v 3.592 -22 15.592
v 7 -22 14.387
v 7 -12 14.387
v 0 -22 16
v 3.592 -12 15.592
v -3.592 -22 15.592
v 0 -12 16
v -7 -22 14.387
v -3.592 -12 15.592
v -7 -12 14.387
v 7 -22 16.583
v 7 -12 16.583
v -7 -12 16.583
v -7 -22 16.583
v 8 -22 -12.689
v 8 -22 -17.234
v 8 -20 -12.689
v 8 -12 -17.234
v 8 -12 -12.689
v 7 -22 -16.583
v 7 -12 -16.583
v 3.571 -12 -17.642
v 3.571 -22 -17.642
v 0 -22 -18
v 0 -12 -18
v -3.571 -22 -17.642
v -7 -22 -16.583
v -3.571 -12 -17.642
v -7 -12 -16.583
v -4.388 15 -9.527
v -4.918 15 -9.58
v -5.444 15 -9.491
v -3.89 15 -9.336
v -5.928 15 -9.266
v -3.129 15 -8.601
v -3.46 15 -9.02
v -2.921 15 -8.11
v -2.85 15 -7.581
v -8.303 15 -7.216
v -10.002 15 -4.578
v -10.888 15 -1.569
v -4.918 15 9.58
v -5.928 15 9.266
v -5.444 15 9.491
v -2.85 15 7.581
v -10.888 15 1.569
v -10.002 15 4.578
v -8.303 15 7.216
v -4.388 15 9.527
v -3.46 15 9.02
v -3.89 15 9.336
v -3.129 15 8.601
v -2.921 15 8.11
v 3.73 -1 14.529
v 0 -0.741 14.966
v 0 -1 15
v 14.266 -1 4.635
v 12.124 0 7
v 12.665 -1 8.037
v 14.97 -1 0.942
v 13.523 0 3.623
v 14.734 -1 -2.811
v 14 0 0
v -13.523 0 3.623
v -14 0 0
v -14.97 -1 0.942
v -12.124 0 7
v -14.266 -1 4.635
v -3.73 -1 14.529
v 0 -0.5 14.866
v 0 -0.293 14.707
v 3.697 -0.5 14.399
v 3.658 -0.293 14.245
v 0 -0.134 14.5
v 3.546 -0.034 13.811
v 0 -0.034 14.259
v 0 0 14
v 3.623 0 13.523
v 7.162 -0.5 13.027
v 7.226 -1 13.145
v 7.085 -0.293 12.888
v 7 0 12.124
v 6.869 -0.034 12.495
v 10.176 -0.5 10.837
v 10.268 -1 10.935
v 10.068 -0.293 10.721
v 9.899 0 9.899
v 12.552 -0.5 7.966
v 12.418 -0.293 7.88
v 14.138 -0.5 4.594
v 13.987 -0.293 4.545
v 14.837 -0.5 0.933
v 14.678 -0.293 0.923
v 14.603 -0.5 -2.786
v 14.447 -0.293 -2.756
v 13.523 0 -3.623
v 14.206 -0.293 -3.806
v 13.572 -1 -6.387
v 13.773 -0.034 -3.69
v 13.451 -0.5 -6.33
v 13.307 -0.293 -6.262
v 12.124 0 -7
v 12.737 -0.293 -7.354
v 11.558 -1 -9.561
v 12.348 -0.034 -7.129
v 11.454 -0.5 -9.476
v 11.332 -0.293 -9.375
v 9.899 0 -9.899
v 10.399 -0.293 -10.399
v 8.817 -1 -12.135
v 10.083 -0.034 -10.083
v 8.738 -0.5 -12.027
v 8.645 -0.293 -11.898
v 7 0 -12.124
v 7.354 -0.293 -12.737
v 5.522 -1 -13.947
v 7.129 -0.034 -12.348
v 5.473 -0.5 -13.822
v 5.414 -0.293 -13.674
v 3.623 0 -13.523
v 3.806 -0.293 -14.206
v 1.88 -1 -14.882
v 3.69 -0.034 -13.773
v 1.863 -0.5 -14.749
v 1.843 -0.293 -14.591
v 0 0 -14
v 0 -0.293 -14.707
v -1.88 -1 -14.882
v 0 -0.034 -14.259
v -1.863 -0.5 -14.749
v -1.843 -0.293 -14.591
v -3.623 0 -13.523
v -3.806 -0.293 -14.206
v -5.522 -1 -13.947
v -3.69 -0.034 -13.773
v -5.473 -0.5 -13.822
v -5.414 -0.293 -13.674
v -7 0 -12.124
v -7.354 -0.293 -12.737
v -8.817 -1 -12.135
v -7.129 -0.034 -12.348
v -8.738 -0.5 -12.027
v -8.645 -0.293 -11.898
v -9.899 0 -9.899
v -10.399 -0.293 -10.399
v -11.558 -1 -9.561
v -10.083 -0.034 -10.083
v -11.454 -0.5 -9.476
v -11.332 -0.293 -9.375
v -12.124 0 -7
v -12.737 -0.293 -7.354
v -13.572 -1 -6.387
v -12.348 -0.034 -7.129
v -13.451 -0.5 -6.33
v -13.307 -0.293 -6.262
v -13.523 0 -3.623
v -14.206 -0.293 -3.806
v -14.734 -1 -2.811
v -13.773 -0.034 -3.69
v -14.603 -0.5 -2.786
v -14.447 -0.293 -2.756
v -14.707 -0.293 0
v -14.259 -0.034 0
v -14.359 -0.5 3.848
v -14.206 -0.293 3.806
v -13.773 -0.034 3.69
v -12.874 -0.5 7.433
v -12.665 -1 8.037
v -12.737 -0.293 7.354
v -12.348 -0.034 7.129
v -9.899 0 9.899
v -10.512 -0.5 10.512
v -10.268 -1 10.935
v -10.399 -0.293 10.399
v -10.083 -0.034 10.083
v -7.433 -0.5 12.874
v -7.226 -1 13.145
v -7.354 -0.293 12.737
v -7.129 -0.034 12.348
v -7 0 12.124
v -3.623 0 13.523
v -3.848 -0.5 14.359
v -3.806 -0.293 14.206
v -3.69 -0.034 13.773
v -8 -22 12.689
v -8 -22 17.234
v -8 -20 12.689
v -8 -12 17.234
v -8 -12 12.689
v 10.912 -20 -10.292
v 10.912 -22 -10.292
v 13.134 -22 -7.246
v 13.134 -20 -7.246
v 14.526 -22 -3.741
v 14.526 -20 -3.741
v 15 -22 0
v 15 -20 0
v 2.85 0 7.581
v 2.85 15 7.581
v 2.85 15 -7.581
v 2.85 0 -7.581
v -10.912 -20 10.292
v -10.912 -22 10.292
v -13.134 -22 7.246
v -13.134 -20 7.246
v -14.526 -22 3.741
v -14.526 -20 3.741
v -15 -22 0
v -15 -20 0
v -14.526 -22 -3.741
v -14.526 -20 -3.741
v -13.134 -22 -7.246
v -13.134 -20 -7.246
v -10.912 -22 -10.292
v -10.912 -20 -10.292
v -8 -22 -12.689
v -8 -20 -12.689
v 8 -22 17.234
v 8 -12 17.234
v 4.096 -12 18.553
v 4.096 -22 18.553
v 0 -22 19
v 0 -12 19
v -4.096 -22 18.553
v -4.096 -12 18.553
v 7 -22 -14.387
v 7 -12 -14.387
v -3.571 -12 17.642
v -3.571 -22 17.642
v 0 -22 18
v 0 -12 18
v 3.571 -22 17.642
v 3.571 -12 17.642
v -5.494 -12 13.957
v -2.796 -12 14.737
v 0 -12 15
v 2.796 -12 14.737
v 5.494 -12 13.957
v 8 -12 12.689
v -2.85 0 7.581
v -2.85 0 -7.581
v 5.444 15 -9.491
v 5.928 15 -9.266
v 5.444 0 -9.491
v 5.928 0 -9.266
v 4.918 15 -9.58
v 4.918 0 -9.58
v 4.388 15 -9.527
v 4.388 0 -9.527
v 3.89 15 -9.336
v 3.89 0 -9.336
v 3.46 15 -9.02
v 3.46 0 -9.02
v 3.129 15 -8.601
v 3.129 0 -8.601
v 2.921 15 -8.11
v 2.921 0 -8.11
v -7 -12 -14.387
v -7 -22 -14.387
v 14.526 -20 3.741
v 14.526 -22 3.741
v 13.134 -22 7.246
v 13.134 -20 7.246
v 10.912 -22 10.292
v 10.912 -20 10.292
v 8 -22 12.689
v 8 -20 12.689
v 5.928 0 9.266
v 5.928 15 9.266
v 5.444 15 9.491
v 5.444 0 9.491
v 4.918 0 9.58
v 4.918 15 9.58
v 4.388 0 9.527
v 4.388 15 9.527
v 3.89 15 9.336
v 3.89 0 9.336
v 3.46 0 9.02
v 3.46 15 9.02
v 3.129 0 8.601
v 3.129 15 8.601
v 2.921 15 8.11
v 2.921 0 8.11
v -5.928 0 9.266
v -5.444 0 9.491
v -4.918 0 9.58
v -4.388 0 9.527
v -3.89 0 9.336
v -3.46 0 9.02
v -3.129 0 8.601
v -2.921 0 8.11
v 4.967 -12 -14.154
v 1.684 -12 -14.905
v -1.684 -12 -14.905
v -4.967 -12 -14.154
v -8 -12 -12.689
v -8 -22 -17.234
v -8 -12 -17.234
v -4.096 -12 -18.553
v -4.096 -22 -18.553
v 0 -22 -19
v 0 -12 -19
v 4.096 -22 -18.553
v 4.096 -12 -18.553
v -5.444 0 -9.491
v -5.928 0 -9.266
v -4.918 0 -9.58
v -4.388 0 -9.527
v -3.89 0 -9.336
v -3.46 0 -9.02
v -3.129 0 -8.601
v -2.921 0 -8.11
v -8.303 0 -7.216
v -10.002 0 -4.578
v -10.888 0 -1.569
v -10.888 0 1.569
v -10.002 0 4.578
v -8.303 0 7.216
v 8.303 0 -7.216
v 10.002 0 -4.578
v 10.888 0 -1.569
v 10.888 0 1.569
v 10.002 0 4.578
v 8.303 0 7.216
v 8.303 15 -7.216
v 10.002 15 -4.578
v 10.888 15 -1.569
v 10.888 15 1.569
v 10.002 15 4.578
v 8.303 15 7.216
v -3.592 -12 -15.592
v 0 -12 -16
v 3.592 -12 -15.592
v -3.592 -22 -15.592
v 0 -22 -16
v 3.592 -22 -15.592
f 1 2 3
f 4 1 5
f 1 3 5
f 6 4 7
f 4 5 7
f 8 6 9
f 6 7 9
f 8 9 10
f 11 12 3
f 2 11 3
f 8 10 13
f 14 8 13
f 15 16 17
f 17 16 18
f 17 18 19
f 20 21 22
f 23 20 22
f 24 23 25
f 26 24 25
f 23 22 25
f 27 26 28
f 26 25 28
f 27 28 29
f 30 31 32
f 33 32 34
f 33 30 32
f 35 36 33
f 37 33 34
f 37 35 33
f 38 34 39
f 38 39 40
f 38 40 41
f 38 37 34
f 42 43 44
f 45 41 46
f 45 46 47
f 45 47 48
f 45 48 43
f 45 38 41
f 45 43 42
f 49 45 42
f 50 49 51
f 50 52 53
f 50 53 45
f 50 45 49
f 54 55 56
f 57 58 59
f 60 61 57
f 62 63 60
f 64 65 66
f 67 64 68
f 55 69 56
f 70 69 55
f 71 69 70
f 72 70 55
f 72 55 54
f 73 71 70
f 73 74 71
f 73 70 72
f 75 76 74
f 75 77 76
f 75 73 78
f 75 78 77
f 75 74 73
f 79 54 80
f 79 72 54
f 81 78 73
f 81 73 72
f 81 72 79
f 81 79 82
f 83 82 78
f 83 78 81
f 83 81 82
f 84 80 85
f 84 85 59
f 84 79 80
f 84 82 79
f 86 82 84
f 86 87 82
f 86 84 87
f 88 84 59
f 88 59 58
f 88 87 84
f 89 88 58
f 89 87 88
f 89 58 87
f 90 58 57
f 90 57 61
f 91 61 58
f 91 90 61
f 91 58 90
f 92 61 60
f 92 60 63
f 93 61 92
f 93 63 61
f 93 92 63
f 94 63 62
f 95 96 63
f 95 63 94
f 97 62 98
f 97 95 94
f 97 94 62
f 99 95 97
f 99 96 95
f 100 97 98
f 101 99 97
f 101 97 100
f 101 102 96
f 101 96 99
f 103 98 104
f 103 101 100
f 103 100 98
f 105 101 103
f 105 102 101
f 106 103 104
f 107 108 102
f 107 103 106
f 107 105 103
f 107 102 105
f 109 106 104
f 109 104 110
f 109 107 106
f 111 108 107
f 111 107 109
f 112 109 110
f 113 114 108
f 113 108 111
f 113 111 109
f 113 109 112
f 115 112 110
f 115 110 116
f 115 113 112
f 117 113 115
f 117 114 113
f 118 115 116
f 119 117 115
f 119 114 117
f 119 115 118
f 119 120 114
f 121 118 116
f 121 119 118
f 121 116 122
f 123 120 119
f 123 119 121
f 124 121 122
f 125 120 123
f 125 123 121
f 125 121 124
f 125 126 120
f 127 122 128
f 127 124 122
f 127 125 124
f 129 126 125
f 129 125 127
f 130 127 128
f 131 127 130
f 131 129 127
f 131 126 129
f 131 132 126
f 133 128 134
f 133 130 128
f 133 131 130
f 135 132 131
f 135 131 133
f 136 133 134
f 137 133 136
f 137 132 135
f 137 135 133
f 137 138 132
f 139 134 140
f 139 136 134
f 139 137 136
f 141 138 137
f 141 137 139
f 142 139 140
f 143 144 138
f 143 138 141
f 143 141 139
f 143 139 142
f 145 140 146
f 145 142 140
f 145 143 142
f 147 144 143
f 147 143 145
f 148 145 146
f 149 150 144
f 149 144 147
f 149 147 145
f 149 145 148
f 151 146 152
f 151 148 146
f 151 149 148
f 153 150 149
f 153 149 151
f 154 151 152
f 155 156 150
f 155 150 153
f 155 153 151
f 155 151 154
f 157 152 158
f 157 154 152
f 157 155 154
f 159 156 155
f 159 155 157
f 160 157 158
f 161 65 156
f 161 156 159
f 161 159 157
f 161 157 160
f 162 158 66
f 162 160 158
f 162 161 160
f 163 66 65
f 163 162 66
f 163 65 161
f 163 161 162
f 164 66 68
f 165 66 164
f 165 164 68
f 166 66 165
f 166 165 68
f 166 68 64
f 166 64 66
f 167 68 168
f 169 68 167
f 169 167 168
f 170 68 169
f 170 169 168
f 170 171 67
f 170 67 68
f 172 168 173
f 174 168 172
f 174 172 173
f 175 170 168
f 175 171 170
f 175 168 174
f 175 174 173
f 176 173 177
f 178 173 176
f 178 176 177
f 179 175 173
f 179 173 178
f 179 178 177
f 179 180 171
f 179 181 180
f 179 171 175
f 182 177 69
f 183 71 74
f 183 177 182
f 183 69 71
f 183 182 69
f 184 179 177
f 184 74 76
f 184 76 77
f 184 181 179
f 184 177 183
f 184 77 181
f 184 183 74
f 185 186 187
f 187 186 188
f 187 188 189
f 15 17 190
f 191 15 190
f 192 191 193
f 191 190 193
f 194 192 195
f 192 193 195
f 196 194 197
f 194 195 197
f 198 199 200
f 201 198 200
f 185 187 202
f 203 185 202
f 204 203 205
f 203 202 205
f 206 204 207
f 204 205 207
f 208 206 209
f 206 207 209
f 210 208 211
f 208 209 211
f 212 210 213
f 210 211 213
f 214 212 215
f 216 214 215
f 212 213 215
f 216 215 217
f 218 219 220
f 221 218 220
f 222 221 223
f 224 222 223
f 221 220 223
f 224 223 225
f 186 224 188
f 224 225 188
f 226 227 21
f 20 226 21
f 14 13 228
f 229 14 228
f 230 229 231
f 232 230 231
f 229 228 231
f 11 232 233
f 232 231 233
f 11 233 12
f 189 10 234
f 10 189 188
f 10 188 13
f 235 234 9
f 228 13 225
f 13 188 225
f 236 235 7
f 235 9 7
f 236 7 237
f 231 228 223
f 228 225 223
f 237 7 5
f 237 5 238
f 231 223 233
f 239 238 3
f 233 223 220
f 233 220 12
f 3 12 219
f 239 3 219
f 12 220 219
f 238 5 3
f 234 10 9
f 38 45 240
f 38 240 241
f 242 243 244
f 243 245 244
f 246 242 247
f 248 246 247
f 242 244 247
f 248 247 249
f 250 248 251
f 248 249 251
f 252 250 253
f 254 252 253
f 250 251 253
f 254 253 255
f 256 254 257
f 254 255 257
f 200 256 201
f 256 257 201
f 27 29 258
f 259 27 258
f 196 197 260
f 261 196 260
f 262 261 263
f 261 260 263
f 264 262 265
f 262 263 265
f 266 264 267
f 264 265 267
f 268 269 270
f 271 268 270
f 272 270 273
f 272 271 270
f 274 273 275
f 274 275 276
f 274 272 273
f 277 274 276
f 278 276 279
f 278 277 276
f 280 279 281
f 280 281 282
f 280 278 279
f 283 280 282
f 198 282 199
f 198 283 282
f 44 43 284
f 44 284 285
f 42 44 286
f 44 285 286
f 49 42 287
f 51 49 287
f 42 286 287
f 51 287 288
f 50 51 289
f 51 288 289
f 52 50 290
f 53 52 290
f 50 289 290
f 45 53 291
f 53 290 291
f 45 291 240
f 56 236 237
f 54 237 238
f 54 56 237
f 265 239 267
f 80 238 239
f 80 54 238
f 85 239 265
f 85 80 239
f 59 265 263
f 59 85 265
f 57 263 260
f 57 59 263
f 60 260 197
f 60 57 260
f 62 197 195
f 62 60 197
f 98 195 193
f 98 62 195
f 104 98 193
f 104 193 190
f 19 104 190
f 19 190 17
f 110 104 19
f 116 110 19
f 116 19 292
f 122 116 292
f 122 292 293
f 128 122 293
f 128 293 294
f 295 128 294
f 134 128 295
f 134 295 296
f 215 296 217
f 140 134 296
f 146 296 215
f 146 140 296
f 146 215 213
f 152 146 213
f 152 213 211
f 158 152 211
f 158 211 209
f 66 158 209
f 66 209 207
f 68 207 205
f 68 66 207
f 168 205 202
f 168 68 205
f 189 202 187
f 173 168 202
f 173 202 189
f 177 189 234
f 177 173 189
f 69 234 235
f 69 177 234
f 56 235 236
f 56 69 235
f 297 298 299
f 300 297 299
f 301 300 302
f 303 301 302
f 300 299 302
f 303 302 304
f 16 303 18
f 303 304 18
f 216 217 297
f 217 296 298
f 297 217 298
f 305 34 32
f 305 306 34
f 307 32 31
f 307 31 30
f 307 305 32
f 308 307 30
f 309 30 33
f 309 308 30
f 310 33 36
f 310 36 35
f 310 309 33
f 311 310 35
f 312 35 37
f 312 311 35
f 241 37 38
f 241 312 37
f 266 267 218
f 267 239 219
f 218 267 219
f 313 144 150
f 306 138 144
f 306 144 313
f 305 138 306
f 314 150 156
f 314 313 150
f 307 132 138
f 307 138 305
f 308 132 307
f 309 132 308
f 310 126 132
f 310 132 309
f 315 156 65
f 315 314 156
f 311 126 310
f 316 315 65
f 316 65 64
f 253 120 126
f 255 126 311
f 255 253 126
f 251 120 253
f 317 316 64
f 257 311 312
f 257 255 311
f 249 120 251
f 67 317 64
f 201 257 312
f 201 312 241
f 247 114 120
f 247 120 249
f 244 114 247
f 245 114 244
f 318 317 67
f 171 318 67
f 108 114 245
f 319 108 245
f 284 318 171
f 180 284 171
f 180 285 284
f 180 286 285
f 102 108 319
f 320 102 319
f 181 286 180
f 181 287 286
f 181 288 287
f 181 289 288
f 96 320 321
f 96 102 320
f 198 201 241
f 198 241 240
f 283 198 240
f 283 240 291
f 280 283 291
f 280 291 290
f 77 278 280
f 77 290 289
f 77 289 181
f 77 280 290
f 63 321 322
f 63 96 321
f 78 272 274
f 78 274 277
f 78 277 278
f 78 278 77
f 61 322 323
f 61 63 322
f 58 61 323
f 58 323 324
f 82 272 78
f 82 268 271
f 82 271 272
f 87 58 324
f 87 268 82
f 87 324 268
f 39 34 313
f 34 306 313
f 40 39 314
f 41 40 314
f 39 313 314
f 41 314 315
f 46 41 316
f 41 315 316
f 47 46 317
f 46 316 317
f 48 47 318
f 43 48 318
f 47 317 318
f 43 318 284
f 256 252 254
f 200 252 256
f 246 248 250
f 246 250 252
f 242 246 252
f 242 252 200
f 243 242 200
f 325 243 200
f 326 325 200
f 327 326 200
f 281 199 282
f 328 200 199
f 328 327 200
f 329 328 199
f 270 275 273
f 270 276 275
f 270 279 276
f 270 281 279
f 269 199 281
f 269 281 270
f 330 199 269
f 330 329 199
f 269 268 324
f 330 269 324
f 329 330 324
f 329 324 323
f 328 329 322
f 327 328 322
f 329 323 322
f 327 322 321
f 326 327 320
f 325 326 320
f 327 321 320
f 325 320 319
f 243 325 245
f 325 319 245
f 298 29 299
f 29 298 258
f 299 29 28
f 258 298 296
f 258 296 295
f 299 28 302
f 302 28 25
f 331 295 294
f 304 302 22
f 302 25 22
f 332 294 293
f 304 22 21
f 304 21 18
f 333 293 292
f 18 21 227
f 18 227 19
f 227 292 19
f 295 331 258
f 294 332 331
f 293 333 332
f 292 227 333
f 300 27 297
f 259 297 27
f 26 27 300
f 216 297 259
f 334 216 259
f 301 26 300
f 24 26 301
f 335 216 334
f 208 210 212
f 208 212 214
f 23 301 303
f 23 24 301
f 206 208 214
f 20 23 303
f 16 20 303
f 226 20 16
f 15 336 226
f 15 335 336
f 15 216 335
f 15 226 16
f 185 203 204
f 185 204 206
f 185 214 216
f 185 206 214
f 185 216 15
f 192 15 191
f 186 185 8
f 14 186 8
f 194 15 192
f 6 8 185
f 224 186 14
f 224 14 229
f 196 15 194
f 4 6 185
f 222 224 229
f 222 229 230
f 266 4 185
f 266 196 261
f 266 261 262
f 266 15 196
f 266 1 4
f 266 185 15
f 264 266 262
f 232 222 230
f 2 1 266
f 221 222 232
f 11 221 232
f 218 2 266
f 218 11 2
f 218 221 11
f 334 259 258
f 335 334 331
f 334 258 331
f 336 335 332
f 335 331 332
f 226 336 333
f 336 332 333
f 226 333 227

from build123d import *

# Parameters (mm, degrees)
SKETCH1_R           = 15
BOSS_EXTRUDE1_DEPTH = 20
SKETCH2_R           = 11
BOSS_EXTRUDE2_DEPTH = 15
SKETCH3_W           = 5.7
SKETCH3_H           = 24
CUT_EXTRUDE1_DEPTH  = 15
FILLET3_R           = 1
FILLET4_R           = 2
BOSS_EXTRUDE3_DEPTH = 2
BOSS_EXTRUDE4_START = -10
BOSS_EXTRUDE4_DEPTH = 10
CUT_EXTRUDE2_DEPTH  = 11
CUT_EXTRUDE3_DEPTH  = 11


with BuildPart() as part:
    # Sketch1 → Boss-Extrude1 (new body)
    with BuildSketch(Plane(origin=(0, 0, 0), x_dir=(1, 0, 0), z_dir=(0, 1, 0))):
        with Locations(Location((0, 0, 0), (0, 0, 270))):
            Circle(SKETCH1_R)
    extrude(amount=-BOSS_EXTRUDE1_DEPTH)

    # Sketch2 → Boss-Extrude2 (add)
    with BuildSketch(Plane(origin=(0, 0, 0), x_dir=(1, 0, 0), z_dir=(0, 1, 0))):
        with Locations(Location((0, 0, 0), (0, 0, 270))):
            Circle(SKETCH2_R)
    extrude(amount=BOSS_EXTRUDE2_DEPTH)

    # Sketch3 → Cut-Extrude1 (cut)
    with BuildSketch(Plane(origin=(0, 15, 0), x_dir=(1, 0, 0), z_dir=(0, 1, 0))):
        Rectangle(SKETCH3_W, SKETCH3_H)
    extrude(amount=-CUT_EXTRUDE1_DEPTH, mode=Mode.SUBTRACT)

    # Fillet3
    fillet3_edges = [part.edges().sort_by_distance(p)[0] for p in [
        (0, 0, -15),
    ]]
    fillet(fillet3_edges, radius=FILLET3_R)

    # Fillet4
    fillet4_edges = [part.edges().sort_by_distance(p)[0] for p in [
        (-2.85, 7.5, -10.624382335),
        (-2.85, 7.5, 10.624382335),
        (2.85, 7.5, 10.624382335),
        (2.85, 7.5, -10.624382335),
    ]]
    fillet(fillet4_edges, radius=FILLET4_R)

    # Sketch4 → Boss-Extrude3 (add)
    with BuildSketch(Plane.XZ.offset(20)):
        with BuildLine():
            ThreePointArc((8, 12.68857754), (0, 15), (-8, 12.68857754))
            Line((-8, 12.68857754), (-8, -12.68857754))
            ThreePointArc((-8, -12.68857754), (0, -15), (8, -12.68857754))
            Line((8, -12.68857754), (8, 12.68857754))
        make_face()
        with BuildLine():
            ThreePointArc((8, 17.23368794), (0, 19), (-8, 17.23368794))
            Line((-8, 17.23368794), (-8, 12.68857754))
            ThreePointArc((-8, 12.68857754), (0, 15), (8, 12.68857754))
            Line((8, 12.68857754), (8, 17.23368794))
        make_face()
        with BuildLine():
            Line((-8, -12.68857754), (-8, -17.23368794))
            ThreePointArc((-8, -17.23368794), (0, -19), (8, -17.23368794))
            Line((8, -17.23368794), (8, -12.68857754))
            ThreePointArc((8, -12.68857754), (0, -15), (-8, -12.68857754))
        make_face()
        with BuildLine():
            Line((-8, -12.68857754), (-8, 12.68857754))
            ThreePointArc((-8, 12.68857754), (-15, 0), (-8, -12.68857754))
        make_face()
        with BuildLine():
            ThreePointArc((15, 0), (13.133925537, 7.245688373), (8, 12.68857754))
            Line((8, 12.68857754), (8, -12.68857754))
            ThreePointArc((8, -12.68857754), (13.133925537, -7.245688373), (15, 0))
        make_face()
    extrude(amount=BOSS_EXTRUDE3_DEPTH)

    # Sketch7 → Boss-Extrude4 (add)
    with BuildSketch(Plane.XZ.offset(22).offset(BOSS_EXTRUDE4_START)):
        with BuildLine():
            Line((-8, -12.68857754), (-8, -17.23368794))
            ThreePointArc((-8, -17.23368794), (0, -19), (8, -17.23368794))
            Line((8, -17.23368794), (8, -12.68857754))
            ThreePointArc((8, -12.68857754), (0, -15), (-8, -12.68857754))
        make_face()
        with BuildLine():
            ThreePointArc((8, 17.23368794), (0, 19), (-8, 17.23368794))
            Line((-8, 17.23368794), (-8, 12.68857754))
            ThreePointArc((-8, 12.68857754), (0, 15), (8, 12.68857754))
            Line((8, 12.68857754), (8, 17.23368794))
        make_face()
    extrude(amount=BOSS_EXTRUDE4_DEPTH)

    # Sketch8 → Cut-Extrude2 (cut)
    with BuildSketch(Plane(origin=(0, -12, 0), x_dir=(1, 0, 0), z_dir=(0, 1, 0))):
        with BuildLine():
            Line((7, 14.38749457), (7, 16.583123952))
            ThreePointArc((7, 16.583123952), (0, 18), (-7, 16.583123952))
            Line((-7, 16.583123952), (-7, 14.38749457))
            ThreePointArc((-7, 14.38749457), (0, 16), (7, 14.38749457))
        make_face()
    extrude(amount=-CUT_EXTRUDE2_DEPTH, mode=Mode.SUBTRACT)

    # Sketch9 → Cut-Extrude3 (cut)
    with BuildSketch(Plane(origin=(0, -12, 0), x_dir=(1, 0, 0), z_dir=(0, 1, 0))):
        with BuildLine():
            Line((-7, -14.38749457), (-7, -16.583123952))
            ThreePointArc((-7, -16.583123952), (0, -18), (7, -16.583123952))
            Line((7, -16.583123952), (7, -14.38749457))
            ThreePointArc((7, -14.38749457), (0, -16), (-7, -14.38749457))
        make_face()
    extrude(amount=-CUT_EXTRUDE3_DEPTH, mode=Mode.SUBTRACT)


solid = part.part
